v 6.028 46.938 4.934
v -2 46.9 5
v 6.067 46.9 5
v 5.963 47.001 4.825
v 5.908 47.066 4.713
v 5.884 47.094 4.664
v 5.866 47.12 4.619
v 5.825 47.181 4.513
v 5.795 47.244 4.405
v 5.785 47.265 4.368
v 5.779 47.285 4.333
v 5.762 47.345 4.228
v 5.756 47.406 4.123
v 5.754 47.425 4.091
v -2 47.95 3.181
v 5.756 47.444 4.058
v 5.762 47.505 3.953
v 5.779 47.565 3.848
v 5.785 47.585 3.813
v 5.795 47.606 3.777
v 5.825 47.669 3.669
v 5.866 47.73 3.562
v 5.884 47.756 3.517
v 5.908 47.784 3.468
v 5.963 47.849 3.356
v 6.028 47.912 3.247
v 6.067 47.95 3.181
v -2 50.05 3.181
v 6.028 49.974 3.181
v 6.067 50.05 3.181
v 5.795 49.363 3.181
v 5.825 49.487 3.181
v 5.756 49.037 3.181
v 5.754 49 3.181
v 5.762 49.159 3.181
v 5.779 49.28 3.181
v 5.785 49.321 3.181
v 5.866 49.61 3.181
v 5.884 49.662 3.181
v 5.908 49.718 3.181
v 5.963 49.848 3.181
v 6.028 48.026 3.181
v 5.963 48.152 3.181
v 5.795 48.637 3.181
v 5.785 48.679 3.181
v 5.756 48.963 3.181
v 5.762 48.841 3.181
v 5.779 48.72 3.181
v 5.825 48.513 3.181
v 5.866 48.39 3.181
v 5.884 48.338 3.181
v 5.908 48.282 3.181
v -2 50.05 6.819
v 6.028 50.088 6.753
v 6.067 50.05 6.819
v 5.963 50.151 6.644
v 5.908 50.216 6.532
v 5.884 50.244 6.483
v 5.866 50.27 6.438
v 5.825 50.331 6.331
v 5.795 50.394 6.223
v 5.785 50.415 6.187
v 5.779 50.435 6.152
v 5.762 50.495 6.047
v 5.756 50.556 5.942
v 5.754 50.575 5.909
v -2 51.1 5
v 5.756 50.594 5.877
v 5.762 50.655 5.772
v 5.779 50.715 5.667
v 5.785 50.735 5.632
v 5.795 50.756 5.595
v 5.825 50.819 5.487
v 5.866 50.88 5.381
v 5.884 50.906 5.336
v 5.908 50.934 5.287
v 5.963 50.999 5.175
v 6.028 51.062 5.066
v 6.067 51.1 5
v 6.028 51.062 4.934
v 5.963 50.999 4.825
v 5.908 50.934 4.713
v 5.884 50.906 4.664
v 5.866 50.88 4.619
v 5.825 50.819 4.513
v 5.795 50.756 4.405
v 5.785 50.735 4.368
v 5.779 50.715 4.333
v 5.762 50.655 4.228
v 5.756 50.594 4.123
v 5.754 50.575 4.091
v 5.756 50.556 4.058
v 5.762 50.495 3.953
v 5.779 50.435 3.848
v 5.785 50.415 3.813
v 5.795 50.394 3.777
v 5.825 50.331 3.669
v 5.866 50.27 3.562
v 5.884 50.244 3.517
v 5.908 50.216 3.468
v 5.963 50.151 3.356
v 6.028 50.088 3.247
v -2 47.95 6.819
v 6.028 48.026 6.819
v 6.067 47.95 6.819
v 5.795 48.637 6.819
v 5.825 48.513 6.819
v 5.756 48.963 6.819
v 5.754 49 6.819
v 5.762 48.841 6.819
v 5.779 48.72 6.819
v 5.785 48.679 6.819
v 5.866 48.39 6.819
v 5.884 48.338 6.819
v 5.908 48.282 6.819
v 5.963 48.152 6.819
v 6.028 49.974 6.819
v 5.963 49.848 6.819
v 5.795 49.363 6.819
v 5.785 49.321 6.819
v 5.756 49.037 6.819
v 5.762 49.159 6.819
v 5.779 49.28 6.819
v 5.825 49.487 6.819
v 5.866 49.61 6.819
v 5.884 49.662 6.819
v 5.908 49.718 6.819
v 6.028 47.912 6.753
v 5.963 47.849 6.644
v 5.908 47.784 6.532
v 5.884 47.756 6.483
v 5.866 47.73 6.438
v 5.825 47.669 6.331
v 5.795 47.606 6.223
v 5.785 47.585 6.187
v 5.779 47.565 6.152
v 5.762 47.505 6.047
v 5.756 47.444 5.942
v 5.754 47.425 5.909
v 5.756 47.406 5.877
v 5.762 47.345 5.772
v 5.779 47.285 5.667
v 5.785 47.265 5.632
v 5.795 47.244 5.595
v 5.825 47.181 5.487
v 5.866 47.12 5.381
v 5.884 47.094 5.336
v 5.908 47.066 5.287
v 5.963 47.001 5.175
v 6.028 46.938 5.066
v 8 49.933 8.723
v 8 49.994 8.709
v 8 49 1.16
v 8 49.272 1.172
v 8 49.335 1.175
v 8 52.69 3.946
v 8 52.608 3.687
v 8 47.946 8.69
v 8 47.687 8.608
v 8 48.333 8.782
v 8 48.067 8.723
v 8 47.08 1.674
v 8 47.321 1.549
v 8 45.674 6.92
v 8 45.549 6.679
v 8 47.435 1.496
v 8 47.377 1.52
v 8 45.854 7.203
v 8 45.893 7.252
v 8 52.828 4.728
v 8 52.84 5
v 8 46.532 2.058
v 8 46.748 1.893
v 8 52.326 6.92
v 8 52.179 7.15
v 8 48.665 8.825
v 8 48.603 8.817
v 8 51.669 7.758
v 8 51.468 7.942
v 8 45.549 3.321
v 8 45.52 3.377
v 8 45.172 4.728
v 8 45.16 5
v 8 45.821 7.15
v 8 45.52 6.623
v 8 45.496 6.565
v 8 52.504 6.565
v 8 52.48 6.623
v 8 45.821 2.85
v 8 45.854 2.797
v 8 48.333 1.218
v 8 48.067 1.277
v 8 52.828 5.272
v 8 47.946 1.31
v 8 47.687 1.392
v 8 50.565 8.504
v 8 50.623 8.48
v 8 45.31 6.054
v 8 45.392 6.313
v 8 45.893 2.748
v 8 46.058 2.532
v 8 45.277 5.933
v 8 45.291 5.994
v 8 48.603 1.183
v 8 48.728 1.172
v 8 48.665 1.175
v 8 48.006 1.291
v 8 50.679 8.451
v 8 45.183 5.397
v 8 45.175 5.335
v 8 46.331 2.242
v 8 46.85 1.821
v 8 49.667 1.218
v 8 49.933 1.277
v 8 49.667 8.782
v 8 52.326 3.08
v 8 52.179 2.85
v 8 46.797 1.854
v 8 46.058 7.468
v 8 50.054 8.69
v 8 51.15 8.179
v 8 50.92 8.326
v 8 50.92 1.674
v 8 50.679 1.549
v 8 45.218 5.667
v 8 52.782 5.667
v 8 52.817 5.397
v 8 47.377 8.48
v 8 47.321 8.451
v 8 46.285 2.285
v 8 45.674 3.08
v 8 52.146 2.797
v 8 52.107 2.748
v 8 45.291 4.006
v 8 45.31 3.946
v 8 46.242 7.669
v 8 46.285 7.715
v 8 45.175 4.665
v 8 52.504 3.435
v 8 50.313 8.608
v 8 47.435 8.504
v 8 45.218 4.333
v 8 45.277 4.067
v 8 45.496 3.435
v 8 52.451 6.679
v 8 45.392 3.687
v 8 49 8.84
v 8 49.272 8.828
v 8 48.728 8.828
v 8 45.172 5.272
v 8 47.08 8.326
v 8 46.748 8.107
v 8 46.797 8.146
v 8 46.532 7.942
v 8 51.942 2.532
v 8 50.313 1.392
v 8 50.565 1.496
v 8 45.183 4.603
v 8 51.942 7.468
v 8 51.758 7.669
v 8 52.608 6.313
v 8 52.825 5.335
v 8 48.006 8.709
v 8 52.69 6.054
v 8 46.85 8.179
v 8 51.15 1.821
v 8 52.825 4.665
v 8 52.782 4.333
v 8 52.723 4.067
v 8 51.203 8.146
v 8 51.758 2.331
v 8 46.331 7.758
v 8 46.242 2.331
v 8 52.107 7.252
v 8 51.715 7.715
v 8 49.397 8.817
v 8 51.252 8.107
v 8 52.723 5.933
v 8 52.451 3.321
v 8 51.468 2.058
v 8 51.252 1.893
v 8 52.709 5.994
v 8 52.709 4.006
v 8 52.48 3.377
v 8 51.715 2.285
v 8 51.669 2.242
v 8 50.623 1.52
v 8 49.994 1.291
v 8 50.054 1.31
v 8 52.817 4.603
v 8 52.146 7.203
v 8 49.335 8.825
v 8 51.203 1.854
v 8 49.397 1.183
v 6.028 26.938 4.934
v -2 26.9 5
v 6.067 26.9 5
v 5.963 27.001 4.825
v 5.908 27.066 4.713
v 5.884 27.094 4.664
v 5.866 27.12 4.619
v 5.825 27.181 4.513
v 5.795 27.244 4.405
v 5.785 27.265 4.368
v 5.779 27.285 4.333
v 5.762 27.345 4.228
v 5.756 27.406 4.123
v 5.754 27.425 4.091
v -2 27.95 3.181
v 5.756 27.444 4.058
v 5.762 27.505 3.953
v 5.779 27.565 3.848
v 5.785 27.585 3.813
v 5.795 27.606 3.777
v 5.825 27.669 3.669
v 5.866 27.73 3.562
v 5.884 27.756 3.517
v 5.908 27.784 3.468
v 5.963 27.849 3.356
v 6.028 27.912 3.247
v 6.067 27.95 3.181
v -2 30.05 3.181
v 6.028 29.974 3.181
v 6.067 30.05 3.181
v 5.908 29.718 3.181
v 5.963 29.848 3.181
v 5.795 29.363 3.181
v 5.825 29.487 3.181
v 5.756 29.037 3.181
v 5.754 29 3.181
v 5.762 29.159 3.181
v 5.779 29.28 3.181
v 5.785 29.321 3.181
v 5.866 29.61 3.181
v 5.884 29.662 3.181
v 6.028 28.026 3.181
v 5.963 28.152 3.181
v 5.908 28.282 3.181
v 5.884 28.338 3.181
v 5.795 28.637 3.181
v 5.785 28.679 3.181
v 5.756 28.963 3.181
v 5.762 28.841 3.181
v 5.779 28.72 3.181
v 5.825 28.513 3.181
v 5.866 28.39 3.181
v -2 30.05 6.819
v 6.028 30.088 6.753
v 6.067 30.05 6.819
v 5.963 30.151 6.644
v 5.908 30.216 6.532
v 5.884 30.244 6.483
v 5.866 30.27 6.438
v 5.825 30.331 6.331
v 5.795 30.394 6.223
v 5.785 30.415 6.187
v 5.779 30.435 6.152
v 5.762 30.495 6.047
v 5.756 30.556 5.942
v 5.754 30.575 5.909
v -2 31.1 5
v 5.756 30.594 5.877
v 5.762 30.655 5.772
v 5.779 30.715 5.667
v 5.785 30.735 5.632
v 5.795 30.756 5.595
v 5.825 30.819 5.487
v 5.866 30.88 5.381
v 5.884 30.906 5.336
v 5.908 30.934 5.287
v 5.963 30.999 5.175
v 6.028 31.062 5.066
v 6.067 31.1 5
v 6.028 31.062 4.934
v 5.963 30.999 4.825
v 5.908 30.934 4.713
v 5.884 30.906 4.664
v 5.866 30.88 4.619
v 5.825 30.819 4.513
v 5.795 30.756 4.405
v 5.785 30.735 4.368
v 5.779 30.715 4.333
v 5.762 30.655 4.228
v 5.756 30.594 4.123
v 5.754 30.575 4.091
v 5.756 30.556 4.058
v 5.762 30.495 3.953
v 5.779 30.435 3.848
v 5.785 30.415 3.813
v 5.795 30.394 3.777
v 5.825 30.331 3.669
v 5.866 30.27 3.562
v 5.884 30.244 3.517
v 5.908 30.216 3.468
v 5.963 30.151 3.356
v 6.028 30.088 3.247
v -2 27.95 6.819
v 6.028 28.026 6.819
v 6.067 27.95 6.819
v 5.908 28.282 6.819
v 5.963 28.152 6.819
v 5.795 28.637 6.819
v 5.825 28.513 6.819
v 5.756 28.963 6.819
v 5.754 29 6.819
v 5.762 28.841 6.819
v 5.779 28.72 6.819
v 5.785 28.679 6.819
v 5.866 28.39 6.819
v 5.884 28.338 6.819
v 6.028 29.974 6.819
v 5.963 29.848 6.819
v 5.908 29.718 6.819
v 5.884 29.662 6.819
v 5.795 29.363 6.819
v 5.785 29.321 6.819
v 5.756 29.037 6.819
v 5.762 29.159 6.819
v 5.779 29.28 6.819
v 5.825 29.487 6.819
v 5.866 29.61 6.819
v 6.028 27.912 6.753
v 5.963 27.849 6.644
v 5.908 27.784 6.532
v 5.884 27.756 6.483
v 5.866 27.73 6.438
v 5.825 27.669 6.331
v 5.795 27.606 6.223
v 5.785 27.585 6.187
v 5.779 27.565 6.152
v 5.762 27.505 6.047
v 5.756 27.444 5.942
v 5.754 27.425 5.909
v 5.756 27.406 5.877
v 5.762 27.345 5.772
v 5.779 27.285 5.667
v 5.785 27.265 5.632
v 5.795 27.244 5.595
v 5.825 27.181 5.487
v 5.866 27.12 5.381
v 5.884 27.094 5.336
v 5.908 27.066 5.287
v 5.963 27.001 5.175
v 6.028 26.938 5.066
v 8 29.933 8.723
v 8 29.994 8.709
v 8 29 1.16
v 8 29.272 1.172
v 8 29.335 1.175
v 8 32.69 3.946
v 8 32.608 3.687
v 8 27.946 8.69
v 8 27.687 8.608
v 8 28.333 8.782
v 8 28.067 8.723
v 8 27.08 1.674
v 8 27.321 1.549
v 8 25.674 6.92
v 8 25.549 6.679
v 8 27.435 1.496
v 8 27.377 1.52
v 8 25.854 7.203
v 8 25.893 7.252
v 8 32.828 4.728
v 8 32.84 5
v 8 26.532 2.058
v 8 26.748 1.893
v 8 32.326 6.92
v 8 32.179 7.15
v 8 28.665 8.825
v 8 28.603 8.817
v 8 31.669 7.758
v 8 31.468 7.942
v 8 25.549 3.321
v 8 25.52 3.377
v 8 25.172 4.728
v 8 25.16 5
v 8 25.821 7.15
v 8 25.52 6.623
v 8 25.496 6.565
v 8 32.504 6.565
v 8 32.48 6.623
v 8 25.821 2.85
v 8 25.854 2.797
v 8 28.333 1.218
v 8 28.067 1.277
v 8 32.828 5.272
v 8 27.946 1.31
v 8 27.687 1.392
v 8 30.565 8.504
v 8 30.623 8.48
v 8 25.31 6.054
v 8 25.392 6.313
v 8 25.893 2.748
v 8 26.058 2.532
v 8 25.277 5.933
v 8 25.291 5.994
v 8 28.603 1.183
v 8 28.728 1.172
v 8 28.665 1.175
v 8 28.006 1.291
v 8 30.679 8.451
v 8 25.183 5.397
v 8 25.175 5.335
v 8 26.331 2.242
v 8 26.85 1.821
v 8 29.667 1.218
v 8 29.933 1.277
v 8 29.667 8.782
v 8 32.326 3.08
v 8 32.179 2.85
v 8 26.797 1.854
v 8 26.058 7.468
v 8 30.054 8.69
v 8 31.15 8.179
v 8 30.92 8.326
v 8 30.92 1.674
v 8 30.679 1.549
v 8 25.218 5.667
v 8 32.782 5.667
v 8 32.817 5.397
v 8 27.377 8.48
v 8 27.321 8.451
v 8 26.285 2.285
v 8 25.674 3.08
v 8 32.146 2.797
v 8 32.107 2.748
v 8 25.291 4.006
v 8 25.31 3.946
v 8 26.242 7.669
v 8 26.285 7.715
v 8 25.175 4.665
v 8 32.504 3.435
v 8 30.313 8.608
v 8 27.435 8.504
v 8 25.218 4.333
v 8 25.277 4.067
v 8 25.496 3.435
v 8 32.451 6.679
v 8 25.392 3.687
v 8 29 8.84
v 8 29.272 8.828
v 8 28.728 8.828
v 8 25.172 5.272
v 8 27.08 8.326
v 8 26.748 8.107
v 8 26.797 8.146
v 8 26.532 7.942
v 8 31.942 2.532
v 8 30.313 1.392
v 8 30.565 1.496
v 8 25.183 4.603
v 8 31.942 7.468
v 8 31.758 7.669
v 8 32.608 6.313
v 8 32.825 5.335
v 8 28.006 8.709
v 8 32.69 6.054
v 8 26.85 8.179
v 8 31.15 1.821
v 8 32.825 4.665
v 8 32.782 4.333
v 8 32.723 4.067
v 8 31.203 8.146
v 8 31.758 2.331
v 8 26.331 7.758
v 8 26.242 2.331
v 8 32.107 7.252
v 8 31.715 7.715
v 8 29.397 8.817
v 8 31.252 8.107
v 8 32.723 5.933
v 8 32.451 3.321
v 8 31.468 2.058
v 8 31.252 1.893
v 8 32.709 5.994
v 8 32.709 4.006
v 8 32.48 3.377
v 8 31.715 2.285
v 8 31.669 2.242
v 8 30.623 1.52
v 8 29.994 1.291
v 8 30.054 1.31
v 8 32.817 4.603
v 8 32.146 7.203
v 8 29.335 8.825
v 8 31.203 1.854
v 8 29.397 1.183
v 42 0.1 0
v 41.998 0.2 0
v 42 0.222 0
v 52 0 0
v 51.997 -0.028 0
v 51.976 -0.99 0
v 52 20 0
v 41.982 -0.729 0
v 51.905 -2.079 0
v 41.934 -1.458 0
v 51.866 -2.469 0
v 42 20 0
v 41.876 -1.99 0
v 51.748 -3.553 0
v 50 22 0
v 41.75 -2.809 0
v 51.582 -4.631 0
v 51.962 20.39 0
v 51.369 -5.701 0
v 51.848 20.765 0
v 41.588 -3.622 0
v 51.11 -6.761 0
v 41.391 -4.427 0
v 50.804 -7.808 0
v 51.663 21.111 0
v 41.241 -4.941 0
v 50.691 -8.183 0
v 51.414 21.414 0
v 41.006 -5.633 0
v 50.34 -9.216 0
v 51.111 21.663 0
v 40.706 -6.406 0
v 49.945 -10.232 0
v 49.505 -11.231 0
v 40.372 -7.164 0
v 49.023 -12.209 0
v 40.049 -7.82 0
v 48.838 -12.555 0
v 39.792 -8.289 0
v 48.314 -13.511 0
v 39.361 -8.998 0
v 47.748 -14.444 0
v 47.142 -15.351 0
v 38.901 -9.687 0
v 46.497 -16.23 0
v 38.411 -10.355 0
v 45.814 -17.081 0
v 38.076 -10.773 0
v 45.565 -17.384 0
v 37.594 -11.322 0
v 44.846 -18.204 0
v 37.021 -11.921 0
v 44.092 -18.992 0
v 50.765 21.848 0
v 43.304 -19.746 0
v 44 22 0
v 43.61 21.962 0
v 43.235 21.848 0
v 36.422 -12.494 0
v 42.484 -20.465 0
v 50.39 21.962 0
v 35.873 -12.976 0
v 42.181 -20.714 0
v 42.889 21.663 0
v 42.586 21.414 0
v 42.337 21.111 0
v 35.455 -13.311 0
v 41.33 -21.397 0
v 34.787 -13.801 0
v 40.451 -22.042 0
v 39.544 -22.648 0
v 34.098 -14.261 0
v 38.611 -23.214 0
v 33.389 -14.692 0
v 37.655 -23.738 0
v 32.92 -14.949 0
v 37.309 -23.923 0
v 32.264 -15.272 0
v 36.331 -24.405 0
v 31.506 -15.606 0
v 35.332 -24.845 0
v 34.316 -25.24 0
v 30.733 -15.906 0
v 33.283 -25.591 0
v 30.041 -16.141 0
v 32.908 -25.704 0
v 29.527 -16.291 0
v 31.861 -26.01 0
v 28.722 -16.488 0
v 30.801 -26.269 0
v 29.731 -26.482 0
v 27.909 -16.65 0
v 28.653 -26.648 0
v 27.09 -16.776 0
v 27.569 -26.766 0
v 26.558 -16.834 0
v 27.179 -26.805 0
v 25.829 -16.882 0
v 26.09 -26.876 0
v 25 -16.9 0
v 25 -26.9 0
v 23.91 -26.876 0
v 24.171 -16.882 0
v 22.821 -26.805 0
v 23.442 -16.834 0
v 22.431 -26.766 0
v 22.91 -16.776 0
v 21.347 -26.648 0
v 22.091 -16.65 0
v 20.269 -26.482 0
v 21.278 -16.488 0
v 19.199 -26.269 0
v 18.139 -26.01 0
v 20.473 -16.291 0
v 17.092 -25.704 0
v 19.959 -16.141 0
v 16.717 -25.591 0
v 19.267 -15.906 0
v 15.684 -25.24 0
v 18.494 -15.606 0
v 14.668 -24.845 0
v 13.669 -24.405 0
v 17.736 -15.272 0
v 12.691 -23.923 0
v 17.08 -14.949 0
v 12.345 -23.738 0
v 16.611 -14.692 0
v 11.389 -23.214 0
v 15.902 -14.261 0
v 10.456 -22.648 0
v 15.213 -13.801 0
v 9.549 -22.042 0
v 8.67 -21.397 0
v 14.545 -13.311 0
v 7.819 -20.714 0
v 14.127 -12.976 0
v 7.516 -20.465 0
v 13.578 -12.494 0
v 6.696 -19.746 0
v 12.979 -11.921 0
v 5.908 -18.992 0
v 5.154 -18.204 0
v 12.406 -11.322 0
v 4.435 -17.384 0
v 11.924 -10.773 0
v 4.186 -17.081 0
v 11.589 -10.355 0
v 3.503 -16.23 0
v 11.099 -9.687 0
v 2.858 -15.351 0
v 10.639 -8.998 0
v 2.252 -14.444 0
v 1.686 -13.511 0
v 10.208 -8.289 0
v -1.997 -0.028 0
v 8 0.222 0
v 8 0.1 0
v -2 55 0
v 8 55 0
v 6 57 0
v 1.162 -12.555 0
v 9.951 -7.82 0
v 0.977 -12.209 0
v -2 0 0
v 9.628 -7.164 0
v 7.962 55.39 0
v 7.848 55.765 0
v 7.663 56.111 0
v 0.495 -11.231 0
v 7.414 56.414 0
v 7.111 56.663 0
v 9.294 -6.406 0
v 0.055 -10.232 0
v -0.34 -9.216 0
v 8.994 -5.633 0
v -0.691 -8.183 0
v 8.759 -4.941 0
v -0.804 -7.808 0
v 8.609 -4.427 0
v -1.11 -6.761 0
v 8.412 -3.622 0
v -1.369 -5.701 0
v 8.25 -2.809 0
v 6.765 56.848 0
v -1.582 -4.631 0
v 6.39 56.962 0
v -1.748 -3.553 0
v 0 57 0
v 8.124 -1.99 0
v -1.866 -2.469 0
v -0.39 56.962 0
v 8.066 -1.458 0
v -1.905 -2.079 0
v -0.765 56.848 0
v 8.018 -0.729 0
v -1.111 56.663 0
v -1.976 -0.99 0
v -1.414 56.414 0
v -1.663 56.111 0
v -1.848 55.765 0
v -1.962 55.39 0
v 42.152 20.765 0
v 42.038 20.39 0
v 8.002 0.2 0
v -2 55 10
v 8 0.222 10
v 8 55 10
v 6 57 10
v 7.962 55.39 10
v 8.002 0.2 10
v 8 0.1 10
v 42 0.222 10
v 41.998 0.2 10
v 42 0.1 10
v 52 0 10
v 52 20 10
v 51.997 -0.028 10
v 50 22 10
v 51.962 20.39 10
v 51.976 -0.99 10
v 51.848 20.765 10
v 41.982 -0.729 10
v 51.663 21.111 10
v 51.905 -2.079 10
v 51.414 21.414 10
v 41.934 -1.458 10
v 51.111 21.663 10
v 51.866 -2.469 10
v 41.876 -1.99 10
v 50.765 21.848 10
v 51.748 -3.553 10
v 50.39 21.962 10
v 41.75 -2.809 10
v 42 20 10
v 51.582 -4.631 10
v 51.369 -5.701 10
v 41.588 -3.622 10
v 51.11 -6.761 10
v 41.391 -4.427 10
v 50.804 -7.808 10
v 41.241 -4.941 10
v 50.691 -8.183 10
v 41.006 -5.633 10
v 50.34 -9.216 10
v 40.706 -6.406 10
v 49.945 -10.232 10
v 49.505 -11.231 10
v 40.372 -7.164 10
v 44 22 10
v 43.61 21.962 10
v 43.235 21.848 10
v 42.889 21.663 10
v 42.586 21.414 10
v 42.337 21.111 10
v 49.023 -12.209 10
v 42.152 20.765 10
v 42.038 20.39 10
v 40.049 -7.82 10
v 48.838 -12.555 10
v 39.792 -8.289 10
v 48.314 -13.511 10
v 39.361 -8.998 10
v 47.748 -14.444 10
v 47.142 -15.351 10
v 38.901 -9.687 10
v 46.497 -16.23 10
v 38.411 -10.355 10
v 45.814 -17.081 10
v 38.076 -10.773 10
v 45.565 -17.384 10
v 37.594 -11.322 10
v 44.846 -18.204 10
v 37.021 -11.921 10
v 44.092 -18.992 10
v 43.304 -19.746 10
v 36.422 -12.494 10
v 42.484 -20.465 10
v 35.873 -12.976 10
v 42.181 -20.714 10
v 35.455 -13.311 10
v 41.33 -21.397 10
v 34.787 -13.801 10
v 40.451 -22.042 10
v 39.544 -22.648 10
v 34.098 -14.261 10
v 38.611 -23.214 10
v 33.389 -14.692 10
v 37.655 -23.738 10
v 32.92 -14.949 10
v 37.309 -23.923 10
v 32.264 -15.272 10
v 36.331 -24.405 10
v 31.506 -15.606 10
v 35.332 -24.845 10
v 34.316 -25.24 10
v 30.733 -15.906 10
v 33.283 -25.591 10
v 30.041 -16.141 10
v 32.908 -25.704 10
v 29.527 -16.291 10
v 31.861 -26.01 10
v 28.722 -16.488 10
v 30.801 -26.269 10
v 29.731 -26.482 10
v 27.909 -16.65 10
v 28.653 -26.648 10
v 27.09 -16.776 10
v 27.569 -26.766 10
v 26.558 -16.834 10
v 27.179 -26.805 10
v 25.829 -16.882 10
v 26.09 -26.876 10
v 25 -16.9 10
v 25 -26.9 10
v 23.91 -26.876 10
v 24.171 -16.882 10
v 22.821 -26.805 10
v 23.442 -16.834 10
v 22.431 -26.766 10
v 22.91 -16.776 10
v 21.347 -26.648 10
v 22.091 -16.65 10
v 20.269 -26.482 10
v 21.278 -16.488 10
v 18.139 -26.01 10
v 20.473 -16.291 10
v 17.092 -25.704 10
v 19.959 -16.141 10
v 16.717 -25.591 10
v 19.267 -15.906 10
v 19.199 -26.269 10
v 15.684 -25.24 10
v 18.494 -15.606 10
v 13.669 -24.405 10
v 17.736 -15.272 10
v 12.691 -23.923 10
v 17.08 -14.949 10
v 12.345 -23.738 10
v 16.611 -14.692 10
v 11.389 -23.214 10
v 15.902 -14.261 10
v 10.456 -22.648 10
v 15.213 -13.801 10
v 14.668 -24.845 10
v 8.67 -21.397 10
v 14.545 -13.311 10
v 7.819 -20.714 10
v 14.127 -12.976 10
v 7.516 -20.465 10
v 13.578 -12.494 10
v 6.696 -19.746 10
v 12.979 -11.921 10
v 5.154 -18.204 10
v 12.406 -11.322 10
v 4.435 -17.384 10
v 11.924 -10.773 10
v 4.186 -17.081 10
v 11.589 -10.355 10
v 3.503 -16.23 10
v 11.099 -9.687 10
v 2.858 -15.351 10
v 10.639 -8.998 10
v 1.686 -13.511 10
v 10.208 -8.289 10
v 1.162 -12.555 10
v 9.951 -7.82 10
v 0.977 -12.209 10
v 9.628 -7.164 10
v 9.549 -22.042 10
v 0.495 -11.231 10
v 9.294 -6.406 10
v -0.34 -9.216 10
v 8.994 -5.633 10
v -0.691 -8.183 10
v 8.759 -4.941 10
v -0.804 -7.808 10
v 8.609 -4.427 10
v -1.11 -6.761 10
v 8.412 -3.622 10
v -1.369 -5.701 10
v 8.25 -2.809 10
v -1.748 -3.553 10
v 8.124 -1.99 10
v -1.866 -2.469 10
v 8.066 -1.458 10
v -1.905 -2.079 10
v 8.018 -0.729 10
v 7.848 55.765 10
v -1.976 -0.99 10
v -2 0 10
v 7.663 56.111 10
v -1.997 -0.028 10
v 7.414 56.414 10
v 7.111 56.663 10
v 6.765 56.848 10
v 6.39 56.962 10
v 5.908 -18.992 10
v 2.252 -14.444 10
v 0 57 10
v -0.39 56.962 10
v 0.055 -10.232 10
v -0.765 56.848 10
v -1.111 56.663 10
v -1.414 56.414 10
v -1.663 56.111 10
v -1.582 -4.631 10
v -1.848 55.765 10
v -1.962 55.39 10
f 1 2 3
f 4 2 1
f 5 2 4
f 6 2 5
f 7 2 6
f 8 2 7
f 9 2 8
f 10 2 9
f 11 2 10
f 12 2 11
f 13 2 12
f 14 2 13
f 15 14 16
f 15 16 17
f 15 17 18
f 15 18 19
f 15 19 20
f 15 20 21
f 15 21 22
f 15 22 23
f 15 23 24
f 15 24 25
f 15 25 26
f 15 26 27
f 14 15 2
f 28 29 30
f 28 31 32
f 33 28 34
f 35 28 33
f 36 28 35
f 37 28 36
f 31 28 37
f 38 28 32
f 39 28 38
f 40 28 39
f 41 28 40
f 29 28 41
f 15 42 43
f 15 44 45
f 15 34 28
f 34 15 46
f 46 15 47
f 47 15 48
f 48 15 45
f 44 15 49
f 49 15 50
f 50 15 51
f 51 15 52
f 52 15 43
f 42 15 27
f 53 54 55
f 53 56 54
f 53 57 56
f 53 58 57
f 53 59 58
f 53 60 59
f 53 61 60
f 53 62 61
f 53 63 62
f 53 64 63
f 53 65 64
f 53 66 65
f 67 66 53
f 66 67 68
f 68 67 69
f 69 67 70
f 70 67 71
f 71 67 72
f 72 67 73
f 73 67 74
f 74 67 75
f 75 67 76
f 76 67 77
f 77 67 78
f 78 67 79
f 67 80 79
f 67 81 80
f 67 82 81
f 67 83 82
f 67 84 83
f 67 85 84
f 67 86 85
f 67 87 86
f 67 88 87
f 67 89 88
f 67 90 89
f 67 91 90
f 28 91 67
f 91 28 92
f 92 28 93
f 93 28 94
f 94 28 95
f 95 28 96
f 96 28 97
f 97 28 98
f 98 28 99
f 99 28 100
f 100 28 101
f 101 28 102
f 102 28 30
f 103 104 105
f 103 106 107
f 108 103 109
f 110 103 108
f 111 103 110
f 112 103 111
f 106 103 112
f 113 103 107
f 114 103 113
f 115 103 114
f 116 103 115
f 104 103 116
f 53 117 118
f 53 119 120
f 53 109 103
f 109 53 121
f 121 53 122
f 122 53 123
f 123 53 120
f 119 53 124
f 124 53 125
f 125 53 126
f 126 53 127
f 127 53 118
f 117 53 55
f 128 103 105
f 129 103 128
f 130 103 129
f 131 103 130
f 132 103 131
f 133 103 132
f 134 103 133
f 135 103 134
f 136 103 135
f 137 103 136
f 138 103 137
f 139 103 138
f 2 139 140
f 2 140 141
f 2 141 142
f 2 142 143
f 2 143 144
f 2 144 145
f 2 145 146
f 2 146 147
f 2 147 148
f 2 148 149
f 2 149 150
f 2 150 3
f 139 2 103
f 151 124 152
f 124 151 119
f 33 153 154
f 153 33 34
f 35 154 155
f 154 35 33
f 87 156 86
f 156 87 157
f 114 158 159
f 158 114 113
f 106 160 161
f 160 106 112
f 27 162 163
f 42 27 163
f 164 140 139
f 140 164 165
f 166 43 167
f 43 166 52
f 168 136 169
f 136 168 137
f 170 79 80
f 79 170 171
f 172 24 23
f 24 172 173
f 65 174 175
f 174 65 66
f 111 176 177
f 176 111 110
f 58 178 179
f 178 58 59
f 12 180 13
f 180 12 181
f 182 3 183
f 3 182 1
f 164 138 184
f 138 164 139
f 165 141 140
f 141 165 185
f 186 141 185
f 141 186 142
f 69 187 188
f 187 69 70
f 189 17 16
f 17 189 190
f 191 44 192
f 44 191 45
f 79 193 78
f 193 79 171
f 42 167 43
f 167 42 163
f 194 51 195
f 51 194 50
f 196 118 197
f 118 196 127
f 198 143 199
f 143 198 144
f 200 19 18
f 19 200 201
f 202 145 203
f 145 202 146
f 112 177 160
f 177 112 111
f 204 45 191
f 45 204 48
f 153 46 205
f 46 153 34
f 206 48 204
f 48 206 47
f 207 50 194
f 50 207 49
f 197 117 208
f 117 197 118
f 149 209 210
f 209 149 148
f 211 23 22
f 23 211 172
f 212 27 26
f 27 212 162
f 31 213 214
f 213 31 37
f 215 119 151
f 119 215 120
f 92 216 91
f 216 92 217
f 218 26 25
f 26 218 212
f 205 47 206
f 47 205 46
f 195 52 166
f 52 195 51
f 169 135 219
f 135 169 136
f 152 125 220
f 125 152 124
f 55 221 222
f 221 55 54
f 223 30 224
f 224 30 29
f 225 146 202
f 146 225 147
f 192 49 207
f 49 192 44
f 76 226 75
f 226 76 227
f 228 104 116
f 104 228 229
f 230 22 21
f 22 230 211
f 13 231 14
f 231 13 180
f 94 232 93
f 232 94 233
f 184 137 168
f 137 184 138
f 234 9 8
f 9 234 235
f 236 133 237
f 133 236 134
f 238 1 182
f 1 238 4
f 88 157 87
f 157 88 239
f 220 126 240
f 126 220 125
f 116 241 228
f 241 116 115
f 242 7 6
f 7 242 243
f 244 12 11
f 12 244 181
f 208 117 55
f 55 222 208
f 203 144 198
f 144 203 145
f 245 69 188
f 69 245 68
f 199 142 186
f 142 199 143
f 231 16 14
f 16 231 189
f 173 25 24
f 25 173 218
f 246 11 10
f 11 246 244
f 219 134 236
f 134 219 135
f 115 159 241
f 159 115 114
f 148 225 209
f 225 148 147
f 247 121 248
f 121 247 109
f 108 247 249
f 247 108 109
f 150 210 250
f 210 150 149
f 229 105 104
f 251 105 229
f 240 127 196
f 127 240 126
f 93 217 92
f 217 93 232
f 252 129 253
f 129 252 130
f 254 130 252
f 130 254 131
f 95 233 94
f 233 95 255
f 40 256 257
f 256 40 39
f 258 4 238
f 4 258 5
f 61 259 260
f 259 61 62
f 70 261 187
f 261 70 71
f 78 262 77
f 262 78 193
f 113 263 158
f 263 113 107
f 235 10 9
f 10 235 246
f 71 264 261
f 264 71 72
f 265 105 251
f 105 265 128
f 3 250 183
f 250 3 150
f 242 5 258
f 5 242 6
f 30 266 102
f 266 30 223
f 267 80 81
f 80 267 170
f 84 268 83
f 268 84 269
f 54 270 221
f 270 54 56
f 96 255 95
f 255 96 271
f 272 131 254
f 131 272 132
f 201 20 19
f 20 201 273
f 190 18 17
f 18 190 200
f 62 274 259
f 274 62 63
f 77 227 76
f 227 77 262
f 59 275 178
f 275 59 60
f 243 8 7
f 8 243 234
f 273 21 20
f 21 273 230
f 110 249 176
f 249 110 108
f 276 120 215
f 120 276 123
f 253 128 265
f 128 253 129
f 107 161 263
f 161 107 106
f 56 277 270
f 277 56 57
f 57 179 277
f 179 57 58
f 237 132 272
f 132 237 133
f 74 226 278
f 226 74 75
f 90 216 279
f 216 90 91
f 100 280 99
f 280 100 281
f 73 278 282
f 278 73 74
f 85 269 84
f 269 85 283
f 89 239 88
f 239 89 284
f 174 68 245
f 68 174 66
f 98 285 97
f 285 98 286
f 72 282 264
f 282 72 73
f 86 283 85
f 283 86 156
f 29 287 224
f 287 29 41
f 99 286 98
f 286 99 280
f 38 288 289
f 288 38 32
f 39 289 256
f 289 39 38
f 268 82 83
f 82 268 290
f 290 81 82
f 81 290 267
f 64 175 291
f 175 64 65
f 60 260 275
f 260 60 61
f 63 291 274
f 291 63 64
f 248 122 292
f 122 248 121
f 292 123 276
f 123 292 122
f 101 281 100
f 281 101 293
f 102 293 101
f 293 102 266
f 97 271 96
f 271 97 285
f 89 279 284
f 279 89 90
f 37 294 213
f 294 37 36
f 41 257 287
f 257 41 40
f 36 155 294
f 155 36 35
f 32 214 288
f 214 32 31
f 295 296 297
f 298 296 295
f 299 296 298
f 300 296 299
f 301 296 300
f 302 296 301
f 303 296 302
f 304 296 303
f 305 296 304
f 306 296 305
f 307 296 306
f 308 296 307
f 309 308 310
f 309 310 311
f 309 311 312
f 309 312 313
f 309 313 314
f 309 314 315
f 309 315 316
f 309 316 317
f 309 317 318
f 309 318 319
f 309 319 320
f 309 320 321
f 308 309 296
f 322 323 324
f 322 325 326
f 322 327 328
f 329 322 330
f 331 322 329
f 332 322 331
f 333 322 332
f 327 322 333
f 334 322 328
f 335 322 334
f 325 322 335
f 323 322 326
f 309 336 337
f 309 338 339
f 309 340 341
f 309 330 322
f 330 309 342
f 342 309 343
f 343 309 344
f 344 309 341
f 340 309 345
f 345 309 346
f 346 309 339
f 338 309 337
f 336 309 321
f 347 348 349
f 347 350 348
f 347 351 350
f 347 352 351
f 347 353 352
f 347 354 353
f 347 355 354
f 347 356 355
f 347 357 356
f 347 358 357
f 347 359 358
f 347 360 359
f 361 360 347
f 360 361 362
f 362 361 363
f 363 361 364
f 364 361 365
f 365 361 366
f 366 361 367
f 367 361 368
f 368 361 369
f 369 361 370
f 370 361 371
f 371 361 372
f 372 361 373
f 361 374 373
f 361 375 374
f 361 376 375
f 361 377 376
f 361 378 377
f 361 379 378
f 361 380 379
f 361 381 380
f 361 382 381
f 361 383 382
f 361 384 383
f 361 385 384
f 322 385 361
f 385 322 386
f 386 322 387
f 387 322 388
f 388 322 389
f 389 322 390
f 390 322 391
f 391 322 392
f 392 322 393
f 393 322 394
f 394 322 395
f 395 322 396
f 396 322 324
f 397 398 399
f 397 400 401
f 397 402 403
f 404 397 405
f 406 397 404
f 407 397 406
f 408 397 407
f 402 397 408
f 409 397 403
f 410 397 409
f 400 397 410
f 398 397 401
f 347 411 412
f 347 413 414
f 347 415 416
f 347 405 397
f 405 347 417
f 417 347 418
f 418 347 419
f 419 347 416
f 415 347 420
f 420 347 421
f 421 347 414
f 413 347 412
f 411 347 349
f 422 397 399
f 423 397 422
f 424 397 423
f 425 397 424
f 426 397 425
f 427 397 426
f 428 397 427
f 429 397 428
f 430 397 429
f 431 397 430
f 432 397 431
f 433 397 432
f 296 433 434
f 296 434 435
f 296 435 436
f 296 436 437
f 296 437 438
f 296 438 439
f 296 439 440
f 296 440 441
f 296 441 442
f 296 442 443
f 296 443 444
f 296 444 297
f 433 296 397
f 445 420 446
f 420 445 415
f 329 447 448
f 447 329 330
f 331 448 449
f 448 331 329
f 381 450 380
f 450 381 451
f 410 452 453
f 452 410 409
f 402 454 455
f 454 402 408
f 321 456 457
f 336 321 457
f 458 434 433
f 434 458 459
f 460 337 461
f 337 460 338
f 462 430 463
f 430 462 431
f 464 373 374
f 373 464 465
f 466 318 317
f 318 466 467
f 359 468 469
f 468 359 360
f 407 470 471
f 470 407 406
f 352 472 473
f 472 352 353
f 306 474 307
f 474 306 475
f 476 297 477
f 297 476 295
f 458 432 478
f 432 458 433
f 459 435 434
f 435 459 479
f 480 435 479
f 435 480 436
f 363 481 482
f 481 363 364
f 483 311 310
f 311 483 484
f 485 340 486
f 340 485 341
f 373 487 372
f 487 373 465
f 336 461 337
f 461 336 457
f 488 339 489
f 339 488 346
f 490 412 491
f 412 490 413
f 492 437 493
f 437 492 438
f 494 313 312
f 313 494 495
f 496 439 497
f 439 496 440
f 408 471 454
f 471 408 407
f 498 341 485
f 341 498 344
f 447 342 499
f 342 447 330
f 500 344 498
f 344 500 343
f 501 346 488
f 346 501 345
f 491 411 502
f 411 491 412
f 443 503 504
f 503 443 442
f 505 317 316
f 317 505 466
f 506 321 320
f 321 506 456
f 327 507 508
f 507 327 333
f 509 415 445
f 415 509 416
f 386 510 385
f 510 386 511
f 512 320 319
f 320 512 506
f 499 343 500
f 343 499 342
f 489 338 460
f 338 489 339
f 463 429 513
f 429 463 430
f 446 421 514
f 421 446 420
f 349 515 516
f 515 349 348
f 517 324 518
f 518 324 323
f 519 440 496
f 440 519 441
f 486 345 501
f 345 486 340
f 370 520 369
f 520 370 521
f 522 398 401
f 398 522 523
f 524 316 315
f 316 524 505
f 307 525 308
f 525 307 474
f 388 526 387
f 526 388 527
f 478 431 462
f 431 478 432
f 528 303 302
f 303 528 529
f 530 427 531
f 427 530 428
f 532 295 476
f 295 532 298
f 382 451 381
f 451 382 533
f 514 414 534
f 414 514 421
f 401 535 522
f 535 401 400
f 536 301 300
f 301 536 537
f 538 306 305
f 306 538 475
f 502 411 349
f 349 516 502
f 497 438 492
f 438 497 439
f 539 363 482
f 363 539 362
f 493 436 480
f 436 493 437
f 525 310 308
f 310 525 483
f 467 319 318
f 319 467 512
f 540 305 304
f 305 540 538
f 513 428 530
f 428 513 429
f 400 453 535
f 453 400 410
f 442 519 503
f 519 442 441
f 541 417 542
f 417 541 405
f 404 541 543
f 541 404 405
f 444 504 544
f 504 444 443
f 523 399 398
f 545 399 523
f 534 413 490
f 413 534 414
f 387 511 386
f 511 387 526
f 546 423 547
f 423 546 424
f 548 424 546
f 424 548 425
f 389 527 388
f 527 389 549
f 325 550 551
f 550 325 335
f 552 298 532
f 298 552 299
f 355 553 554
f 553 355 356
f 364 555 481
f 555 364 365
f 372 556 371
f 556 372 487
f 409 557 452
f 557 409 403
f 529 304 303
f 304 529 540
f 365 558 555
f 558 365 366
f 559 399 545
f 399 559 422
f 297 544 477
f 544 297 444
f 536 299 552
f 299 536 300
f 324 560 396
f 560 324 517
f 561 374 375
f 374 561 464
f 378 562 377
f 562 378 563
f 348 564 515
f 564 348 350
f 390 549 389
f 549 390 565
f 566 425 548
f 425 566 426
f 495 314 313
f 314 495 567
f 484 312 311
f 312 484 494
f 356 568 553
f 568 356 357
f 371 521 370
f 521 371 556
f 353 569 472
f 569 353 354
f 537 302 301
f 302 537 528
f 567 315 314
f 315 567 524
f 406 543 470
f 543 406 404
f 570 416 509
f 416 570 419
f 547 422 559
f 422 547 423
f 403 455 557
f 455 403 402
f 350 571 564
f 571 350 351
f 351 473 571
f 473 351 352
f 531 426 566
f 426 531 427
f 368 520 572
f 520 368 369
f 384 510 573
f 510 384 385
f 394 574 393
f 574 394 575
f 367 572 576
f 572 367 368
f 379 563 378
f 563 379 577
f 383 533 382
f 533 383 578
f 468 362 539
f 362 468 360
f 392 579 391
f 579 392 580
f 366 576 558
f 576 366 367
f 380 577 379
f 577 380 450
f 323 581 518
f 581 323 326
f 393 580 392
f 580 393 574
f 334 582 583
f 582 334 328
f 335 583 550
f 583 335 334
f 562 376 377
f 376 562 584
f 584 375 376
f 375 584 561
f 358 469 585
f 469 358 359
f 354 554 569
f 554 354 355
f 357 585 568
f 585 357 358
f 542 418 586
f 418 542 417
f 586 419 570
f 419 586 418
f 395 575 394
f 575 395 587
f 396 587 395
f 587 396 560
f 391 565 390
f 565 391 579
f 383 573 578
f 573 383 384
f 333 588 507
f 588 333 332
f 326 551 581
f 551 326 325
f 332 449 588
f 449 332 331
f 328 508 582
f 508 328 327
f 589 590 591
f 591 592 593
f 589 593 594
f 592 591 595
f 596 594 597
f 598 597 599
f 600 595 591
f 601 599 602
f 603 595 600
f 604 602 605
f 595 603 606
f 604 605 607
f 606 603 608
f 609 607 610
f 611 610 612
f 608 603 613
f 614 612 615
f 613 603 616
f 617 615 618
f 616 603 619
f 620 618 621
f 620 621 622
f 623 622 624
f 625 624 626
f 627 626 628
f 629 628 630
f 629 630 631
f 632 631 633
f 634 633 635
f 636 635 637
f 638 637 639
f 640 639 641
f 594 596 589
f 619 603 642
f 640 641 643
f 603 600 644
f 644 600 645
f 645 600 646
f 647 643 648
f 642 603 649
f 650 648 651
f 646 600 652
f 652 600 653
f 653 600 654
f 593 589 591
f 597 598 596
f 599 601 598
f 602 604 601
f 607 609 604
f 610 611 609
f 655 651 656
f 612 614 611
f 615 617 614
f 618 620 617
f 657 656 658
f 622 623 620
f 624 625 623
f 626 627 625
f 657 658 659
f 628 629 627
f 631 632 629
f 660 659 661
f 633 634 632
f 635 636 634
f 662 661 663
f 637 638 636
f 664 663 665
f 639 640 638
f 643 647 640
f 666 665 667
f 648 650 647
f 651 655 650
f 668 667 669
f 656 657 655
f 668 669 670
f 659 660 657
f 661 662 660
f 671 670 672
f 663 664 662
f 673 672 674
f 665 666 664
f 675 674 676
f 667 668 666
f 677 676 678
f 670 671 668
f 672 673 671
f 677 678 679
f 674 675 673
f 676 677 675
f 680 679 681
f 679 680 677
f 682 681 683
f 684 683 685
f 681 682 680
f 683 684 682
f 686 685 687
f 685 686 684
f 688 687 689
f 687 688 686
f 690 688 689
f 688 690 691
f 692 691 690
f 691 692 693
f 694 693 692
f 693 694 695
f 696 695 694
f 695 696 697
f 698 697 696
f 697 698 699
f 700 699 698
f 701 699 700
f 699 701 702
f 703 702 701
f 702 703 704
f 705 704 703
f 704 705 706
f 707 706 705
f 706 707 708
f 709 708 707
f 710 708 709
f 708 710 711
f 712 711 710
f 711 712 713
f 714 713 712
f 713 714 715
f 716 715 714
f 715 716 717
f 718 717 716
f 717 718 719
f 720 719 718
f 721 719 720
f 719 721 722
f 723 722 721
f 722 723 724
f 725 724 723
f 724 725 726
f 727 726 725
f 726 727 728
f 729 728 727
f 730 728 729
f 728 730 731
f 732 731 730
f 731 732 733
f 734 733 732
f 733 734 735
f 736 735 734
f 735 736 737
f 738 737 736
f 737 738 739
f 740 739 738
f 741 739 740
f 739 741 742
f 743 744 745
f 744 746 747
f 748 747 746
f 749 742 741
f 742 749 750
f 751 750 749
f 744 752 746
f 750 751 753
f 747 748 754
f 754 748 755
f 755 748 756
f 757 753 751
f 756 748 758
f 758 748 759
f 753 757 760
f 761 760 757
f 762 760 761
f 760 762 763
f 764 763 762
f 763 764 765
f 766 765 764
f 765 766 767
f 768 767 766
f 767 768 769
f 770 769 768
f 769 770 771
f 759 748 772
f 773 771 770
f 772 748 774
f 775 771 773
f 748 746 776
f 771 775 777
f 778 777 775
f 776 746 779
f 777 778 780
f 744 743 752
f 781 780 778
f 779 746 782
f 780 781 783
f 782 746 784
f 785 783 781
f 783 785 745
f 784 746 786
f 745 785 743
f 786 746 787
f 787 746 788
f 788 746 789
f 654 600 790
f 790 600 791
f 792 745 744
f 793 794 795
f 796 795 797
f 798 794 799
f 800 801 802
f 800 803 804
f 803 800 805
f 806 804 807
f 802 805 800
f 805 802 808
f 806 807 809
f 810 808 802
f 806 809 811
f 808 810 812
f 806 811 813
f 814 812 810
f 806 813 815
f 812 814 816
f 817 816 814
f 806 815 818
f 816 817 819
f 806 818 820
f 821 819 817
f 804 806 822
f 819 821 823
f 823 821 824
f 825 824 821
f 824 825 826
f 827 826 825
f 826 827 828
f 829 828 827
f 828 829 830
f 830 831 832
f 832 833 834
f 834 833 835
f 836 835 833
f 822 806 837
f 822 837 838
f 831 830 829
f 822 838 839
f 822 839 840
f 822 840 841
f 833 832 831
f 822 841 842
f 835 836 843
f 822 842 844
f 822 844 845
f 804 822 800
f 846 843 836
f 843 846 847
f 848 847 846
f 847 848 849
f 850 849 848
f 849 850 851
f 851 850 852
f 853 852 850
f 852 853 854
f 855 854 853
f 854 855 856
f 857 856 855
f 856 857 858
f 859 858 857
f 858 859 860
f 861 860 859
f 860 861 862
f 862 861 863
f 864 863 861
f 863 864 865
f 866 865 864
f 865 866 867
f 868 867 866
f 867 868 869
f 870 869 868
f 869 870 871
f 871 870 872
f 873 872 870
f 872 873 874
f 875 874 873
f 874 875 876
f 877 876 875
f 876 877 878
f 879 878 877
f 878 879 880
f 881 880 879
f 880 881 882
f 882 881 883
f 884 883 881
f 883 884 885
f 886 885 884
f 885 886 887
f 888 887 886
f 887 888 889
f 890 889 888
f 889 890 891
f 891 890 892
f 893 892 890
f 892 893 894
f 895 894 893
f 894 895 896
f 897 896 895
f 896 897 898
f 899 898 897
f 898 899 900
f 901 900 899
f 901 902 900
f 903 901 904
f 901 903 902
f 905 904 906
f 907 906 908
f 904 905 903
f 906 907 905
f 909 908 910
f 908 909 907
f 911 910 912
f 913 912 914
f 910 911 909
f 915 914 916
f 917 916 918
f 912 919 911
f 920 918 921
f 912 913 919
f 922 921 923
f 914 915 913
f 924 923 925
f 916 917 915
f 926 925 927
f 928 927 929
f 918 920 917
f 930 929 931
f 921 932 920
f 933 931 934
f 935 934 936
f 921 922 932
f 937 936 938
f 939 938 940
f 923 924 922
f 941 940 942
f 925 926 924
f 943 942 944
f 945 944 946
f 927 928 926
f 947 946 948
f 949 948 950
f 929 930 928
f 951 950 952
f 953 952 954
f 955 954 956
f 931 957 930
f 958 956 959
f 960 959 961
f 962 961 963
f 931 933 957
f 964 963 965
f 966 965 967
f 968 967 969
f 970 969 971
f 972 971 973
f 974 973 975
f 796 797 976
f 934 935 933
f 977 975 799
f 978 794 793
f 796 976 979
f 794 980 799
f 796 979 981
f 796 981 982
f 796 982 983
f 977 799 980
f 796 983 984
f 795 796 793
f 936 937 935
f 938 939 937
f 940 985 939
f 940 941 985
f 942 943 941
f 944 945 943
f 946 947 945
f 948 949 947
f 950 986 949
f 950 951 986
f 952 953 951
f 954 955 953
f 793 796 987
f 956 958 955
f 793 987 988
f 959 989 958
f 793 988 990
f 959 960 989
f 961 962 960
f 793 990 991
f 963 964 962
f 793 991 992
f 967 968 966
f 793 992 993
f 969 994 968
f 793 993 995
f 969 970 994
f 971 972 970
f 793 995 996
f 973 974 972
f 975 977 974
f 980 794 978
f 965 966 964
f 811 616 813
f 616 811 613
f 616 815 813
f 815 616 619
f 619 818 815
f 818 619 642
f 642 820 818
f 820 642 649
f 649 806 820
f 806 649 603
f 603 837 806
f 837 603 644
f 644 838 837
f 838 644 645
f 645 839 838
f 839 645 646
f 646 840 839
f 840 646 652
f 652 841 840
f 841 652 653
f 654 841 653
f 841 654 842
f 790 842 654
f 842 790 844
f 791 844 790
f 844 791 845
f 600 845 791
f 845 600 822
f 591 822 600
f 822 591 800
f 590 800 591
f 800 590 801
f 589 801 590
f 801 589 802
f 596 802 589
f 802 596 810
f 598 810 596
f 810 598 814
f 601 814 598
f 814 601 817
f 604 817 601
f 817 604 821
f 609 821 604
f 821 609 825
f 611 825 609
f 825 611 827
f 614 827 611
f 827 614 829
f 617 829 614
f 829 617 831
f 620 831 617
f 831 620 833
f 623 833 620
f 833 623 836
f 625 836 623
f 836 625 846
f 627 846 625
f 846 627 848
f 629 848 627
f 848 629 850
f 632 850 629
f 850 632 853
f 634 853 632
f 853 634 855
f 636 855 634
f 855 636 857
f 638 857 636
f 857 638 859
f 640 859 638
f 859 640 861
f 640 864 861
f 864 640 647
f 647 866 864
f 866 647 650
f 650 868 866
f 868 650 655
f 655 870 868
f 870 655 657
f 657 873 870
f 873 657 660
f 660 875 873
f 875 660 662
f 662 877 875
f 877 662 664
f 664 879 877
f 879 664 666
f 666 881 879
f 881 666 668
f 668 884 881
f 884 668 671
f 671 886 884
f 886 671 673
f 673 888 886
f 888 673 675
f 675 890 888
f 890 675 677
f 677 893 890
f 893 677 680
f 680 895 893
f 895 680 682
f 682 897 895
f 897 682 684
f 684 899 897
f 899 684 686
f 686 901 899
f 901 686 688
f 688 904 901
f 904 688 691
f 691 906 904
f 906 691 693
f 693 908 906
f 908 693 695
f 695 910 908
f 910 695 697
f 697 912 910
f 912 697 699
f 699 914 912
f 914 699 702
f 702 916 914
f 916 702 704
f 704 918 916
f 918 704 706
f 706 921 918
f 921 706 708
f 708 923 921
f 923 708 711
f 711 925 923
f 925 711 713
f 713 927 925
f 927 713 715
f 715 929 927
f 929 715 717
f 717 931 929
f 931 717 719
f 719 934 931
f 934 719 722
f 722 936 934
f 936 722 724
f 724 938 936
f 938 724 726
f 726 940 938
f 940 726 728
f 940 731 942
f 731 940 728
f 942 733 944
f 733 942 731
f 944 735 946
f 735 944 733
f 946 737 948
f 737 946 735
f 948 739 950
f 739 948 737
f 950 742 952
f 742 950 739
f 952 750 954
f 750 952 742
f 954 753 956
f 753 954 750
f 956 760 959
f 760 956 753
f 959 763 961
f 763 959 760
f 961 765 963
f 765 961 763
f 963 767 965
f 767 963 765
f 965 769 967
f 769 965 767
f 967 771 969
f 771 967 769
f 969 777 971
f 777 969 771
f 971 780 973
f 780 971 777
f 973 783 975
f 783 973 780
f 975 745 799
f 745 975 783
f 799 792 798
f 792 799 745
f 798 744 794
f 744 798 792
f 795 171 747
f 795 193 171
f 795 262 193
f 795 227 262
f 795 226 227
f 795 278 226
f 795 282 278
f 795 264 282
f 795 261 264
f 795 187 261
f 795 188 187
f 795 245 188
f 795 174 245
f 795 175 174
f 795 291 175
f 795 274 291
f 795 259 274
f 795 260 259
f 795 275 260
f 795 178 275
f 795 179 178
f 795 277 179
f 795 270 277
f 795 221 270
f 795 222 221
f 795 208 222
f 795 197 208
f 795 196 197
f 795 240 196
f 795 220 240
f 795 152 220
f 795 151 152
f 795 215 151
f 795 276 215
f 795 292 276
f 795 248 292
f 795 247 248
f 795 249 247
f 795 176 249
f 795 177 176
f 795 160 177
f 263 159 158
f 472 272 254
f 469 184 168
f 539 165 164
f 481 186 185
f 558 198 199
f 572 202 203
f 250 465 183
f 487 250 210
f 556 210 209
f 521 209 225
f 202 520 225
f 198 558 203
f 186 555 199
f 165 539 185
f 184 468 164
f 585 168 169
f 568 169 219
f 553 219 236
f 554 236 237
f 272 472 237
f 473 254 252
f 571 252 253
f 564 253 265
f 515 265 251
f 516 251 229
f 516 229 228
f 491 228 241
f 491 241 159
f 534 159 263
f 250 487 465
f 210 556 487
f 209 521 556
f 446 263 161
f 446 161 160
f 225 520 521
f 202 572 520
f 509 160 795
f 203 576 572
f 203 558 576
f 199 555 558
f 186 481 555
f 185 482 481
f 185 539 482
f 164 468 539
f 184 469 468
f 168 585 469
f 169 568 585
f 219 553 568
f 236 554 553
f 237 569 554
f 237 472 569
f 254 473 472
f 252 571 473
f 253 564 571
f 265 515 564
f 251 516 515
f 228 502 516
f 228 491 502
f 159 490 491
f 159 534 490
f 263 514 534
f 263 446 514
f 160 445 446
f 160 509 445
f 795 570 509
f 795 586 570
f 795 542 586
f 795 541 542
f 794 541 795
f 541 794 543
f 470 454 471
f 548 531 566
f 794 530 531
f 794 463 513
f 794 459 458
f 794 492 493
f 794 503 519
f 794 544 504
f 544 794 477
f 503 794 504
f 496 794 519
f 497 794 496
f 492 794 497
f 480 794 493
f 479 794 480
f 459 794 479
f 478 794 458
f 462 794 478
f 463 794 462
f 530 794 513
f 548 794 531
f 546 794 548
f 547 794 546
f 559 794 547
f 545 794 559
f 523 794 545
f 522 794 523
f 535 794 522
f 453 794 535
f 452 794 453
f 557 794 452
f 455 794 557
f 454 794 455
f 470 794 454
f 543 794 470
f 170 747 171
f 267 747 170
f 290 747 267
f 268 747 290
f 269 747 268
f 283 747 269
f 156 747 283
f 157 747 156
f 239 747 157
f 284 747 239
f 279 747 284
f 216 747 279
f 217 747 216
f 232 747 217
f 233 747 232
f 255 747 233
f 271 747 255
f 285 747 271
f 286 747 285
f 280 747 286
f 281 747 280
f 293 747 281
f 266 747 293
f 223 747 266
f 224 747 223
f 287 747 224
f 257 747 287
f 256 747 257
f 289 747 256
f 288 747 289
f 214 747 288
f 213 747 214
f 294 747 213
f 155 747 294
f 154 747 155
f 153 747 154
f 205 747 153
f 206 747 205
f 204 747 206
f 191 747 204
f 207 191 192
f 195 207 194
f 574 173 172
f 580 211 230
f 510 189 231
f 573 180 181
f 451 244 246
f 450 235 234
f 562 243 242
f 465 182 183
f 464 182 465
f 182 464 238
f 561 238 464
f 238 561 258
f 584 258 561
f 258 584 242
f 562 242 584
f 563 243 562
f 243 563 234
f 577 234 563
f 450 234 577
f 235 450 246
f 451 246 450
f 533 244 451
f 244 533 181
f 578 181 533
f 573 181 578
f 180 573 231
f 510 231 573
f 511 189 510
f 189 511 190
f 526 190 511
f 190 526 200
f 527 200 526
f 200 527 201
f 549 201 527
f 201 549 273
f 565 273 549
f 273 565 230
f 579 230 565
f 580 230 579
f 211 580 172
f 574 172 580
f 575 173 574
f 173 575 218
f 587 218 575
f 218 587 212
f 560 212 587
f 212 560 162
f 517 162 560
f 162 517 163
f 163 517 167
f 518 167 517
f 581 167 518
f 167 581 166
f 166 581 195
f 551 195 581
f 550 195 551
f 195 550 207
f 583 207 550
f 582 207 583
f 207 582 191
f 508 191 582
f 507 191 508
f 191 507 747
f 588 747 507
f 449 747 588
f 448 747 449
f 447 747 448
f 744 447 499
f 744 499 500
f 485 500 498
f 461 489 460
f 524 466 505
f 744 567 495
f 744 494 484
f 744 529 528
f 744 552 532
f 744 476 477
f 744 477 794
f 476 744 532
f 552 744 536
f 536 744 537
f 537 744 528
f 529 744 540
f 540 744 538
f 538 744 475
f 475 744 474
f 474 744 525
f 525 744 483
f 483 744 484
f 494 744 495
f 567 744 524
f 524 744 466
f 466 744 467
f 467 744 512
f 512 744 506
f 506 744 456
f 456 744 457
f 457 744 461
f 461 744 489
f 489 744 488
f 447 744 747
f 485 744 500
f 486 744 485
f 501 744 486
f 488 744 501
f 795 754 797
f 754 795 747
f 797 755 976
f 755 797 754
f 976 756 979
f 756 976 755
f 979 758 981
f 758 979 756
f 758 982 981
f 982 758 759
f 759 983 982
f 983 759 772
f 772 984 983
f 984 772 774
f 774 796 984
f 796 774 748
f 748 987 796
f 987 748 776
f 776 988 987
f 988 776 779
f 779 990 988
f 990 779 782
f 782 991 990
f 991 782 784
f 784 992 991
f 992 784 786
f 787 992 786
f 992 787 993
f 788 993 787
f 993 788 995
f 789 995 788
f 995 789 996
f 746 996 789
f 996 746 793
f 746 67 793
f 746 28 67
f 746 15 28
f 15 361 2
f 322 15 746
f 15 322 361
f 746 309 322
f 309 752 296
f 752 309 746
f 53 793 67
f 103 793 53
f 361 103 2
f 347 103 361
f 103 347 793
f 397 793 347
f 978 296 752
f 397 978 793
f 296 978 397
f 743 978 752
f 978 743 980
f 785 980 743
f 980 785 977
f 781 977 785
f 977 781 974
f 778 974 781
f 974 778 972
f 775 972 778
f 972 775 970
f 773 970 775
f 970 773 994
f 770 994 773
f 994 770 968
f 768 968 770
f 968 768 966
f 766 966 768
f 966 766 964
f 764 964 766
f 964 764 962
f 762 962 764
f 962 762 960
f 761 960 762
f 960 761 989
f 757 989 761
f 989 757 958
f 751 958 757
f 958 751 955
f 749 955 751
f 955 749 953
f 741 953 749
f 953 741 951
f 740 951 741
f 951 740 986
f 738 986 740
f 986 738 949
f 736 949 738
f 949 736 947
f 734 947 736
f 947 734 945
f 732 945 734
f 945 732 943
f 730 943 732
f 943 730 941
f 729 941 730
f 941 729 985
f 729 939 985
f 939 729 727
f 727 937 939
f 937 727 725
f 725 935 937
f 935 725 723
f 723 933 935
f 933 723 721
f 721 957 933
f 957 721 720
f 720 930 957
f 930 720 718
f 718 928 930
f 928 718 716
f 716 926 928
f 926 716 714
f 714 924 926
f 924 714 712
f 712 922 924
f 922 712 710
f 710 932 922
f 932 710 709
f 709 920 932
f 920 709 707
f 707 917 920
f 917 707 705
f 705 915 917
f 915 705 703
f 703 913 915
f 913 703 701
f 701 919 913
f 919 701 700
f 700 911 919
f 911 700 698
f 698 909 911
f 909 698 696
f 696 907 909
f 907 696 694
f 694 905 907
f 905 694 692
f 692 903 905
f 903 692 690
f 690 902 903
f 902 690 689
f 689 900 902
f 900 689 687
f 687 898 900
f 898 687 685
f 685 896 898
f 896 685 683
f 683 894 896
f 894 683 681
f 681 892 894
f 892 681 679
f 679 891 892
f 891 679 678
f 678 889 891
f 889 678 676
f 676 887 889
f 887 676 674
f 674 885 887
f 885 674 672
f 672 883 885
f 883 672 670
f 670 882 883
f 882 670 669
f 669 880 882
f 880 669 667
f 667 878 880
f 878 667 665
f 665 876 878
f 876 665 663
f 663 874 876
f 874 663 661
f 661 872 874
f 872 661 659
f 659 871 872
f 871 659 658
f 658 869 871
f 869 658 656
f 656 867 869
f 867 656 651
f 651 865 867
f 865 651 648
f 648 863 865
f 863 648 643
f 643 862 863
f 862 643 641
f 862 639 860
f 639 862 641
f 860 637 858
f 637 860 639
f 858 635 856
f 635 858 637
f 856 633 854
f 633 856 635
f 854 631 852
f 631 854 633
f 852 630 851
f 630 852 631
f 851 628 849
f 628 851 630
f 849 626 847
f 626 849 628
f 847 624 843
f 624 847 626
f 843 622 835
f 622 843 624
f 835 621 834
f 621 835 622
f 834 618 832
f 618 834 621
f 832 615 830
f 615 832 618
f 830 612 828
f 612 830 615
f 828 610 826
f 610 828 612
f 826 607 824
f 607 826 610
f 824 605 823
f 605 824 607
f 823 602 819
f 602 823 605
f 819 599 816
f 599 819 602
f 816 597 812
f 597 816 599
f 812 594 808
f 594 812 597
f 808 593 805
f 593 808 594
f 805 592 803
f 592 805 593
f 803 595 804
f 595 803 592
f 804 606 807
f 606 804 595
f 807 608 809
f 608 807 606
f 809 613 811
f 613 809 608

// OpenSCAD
// simple parametric hook 0.2
// instruction poetry by byteborg, 2013
// karsten@rohrbach.de
// CC BY-NC 3.0

/* [Global] */
// How high should the hook be?
HEIGHT = 80; // [40:200]
// How deep should it reach?
DEPTH = 50;  // [15:150]
// Overall material thickness
ZTHICKNESS = 10; // [5:20]
// How long should the hook extend from the bottom half-circle?
LOOPLENGTH = 20;  // [0:100]
// Rounding factor
ROUNDING = 2; // [0.0:4.0]
// Mounting hole spacing
HOLESPACING = 20; // [0:100]
// Mounting hole diameter
HOLEDIA = 4; // [2.5, 3, 4, 5]

/* [Hidden] */
THICKNESS = ZTHICKNESS - ROUNDING*2;
q = .1;

print_part();

module screw() {
    rotate([0, 0, 30]) cylinder(h=15+ZTHICKNESS, r=(HOLEDIA+.2)/2, center=true, $fn=6);
    translate([0, 0, 15/2]) cylinder(h=5, r1=1.5, r2=6, center=true, $fn=72);
}

module print_part() {
    difference() {
        linear_extrude(height=ZTHICKNESS) {
            minkowski() {
                union() {
                    translate([0, 0]) square([THICKNESS, HEIGHT-DEPTH/2]);
                    translate([DEPTH-THICKNESS, 0]) square([THICKNESS, LOOPLENGTH]);
                    translate([DEPTH/2, q]) difference() {
                        circle(r=DEPTH/2, $fn=144);
                        translate([-DEPTH, q]) square([DEPTH*2, DEPTH]);
                        circle(r=DEPTH/2-THICKNESS, $fn=144);
                    }
                }
                circle(r=ROUNDING, $fn=32);
            }
        }
        translate([ZTHICKNESS - 9.6, HEIGHT-DEPTH/2-ZTHICKNESS/2-ROUNDING/2, ZTHICKNESS/2]) rotate([0, 90, 0]) {
            translate([0, 0, 0]) screw();
            translate([0, -HOLESPACING, 0]) screw();
        }
    }
}

//.
